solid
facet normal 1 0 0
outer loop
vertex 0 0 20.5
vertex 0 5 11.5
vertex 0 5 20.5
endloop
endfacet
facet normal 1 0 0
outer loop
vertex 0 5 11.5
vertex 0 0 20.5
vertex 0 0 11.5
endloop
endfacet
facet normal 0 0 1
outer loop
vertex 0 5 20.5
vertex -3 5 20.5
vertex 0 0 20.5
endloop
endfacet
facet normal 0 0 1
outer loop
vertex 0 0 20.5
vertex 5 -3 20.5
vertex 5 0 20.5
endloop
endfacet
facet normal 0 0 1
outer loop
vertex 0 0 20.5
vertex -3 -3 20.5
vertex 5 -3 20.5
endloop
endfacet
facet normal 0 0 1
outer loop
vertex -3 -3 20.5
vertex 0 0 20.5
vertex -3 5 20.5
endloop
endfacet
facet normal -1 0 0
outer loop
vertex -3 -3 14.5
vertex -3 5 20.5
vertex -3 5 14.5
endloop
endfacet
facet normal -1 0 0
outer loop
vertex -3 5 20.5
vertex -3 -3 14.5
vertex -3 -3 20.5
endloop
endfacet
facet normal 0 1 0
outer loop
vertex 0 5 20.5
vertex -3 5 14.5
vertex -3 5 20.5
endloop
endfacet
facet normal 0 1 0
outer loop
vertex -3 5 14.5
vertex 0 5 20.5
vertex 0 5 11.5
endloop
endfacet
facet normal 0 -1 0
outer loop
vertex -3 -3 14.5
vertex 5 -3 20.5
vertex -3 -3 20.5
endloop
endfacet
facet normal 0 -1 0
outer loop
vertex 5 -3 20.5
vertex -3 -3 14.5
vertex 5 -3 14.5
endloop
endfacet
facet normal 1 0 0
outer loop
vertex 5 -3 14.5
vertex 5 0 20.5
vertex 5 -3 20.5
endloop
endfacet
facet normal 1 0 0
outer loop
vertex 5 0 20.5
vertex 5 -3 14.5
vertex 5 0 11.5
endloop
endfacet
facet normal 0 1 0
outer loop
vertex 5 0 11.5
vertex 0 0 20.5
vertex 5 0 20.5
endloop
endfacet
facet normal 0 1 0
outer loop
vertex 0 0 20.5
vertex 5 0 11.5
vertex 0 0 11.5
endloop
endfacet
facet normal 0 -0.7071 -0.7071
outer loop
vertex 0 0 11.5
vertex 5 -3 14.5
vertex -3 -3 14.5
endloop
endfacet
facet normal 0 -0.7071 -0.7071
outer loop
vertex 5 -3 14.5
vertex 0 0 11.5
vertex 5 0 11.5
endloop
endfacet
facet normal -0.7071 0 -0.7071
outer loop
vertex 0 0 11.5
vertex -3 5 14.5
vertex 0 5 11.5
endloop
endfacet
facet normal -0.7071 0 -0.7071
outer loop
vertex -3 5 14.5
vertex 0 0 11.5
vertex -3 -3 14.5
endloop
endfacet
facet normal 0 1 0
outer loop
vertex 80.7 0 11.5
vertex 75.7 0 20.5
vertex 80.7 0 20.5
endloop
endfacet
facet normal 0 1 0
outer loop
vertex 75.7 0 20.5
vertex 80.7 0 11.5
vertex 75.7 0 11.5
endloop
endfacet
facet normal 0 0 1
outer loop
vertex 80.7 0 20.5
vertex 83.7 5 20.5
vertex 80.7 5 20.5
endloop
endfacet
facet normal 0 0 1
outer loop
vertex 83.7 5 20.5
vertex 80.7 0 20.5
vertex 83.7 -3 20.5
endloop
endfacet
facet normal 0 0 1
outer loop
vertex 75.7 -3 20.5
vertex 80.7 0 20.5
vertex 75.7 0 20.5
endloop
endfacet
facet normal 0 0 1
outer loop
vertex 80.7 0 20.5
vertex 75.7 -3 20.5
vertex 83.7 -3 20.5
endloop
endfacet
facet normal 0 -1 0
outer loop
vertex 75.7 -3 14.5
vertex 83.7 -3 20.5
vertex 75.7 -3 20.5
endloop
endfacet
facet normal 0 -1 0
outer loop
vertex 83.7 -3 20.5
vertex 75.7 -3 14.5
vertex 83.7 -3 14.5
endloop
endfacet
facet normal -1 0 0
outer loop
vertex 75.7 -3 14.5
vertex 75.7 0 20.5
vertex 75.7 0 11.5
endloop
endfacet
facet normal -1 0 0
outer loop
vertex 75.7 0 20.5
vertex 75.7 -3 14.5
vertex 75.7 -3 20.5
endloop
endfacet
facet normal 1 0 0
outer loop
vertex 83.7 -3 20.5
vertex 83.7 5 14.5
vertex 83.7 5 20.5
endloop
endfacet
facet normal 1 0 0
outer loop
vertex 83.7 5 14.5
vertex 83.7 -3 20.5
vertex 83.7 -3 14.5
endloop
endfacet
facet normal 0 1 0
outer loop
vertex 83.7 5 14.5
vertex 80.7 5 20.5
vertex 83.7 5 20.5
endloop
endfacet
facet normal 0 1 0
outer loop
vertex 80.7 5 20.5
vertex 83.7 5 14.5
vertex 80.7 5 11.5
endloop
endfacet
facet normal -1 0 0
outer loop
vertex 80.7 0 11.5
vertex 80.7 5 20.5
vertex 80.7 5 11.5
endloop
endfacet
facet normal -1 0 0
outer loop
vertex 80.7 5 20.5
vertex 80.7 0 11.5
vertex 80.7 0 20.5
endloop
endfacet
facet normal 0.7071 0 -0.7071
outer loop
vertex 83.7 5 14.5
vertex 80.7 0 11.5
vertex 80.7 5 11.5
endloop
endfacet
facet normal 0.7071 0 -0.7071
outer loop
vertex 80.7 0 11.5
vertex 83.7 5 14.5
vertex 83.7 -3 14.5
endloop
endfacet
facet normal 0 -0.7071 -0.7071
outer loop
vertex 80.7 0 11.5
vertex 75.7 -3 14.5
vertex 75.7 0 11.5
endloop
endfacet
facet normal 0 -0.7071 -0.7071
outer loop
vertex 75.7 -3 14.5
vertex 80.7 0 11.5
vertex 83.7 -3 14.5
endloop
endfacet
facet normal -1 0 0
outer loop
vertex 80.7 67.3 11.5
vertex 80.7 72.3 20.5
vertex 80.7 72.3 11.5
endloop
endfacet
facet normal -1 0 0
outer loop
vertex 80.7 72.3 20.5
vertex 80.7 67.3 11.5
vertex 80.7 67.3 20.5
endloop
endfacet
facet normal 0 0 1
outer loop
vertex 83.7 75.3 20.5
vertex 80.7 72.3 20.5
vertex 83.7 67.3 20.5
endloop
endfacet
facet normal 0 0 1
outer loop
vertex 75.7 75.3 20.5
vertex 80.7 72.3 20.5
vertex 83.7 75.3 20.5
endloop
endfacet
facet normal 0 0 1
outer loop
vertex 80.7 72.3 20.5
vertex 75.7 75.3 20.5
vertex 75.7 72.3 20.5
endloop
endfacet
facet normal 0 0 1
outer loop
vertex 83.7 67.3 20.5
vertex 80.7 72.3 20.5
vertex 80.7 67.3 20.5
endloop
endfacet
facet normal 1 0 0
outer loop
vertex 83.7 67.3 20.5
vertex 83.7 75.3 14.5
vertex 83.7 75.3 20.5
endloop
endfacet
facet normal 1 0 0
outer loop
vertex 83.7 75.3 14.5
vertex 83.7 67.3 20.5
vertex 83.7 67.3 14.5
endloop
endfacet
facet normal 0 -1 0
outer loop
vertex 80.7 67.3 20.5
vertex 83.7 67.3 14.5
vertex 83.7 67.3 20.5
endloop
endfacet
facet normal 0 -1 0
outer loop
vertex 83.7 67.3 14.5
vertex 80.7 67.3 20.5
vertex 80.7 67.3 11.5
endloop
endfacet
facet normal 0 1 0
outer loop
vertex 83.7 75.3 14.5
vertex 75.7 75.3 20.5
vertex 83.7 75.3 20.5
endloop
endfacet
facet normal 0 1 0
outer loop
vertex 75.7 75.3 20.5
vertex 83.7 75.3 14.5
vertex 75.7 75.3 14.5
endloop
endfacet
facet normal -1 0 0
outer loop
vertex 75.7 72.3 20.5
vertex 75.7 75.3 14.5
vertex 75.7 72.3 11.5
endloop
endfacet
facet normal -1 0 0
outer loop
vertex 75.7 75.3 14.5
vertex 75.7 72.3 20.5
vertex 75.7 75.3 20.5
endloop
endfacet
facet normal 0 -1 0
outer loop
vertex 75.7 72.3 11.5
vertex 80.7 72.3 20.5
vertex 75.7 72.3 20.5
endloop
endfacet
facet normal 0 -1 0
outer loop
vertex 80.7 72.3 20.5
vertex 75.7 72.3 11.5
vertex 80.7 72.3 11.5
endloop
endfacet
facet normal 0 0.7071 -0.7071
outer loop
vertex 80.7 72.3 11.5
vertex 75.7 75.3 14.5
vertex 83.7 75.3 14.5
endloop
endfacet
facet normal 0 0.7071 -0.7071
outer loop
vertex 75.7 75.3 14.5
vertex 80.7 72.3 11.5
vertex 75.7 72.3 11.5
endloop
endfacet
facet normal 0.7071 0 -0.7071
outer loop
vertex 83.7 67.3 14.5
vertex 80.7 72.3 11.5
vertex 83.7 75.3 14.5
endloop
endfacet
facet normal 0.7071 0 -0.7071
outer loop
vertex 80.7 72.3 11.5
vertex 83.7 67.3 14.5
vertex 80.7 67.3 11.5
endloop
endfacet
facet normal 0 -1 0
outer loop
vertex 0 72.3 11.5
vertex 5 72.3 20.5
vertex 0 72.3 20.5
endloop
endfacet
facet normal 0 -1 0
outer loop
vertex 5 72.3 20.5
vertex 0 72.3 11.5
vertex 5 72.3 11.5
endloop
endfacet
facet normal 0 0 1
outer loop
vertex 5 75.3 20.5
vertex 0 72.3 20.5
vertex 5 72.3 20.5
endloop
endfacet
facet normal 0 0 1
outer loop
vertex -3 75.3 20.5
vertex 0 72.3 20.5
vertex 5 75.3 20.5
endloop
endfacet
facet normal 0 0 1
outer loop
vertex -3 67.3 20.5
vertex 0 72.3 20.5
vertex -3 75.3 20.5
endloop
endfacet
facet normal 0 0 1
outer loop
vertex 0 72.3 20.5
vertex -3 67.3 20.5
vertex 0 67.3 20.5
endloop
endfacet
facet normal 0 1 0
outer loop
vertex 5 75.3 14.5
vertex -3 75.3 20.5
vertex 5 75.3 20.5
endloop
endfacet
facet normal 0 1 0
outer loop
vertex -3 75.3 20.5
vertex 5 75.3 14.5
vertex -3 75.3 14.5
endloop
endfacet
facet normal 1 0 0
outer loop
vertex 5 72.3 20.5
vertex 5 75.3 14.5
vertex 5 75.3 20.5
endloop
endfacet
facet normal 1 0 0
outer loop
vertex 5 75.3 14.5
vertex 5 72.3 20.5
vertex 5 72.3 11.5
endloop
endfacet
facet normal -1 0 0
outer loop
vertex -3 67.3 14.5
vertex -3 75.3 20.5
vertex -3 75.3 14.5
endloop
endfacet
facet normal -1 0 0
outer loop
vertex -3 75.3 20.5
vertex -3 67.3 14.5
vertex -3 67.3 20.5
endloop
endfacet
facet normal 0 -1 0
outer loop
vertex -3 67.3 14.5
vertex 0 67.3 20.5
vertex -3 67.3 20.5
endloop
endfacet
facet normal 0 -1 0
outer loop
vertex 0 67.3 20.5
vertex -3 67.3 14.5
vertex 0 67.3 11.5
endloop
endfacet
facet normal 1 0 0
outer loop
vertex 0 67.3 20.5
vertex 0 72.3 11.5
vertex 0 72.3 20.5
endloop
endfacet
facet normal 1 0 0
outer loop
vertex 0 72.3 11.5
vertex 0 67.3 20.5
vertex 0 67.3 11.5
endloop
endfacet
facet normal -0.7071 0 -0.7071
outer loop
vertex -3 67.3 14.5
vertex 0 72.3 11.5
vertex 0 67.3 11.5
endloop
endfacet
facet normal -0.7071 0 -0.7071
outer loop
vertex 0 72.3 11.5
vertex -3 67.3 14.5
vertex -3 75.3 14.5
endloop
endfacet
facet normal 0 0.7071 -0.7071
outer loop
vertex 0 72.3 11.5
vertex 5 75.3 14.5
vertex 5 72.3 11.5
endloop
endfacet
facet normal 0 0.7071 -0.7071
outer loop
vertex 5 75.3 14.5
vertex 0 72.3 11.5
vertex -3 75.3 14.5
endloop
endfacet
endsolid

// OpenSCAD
// Bloc Glockenspiel Moteur

// Hauteur : 15 mm
// Largeur : 72 mm
// Longueur : 80.5 mm

Hauteur = 17.5;
Largeur = 72.3;
Longueur = 80.7;
EpaisseurCale = 3;
EpaisseurAxes = 5;
EpaisseurSocle = 20;

//support ();

translate ([ -EpaisseurCale, -EpaisseurCale, Hauteur - EpaisseurCale] ) 
	cale ();

translate ([ Longueur + EpaisseurCale, -EpaisseurCale, Hauteur - EpaisseurCale] ) 
	rotate ([ 0, 0, 90])
		cale ();

translate ([ Longueur + EpaisseurCale, Largeur + EpaisseurCale, Hauteur - EpaisseurCale] ) 
	rotate ([ 0, 0, 180])
		cale ();

translate ([ -EpaisseurCale, Largeur + EpaisseurCale, Hauteur - EpaisseurCale] ) 
	rotate ([ 0, 0, 270])
		cale ();

module cale ()
{
	C0 = [ EpaisseurAxes + EpaisseurCale, 0,             0];
	C1 = [ 0,             0,             0];
	C2 = [ 0,             EpaisseurAxes + EpaisseurCale, 0];
	C3 = [ EpaisseurAxes + EpaisseurCale, EpaisseurCale, 0];
	C4 = [ EpaisseurCale, EpaisseurCale, 0];
	C5 = [ EpaisseurCale, EpaisseurAxes + EpaisseurCale, 0];
	C6 = [ EpaisseurAxes + EpaisseurCale, EpaisseurCale, -EpaisseurCale];
	C7 = [ EpaisseurCale, EpaisseurCale, -EpaisseurCale];
	C8 = [ EpaisseurCale, EpaisseurAxes + EpaisseurCale, -EpaisseurCale];

	cube ( [ EpaisseurCale, EpaisseurAxes + EpaisseurCale, EpaisseurCale * 2] );
	cube ( [ EpaisseurAxes + EpaisseurCale, EpaisseurCale, EpaisseurCale * 2] );

	polyhedron 
		( points = [ 
				   C0, C1, C2, C3, C4, C5, C6, C7, C8,
				  ],
		  triangles = [ 
					[ 0, 3, 6], [ 2, 8, 5],
					[ 3, 4, 7], [ 6, 3, 7],
					[ 5, 7, 4], [ 5, 8, 7],
					[ 0, 7, 1], [ 0, 6, 7],
					[ 1, 8, 2], [ 1, 7, 8],
					[ 0, 1, 4], [ 0, 4, 3],
					[ 4, 2, 5], [ 4, 1, 2],
				  ]
		);
}

module support ()
{
P0  = [ 0, 0, 0];
P1  = [ 0, EpaisseurAxes, 0];
P2  = [ Longueur / 2 - EpaisseurAxes, Largeur / 2, 0];
P3  = [ 0, Largeur - EpaisseurAxes, 0];
P4  = [ 0, Largeur, 0];
P5  = [ EpaisseurAxes, Largeur, 0];
P6  = [ Longueur / 2, Largeur / 2 + EpaisseurAxes, 0];
P7  = [ Longueur - EpaisseurAxes, Largeur, 0];
P8  = [ Longueur, Largeur, 0];
P9  = [ Longueur, Largeur - EpaisseurAxes, 0];
P10 = [ Longueur / 2 + EpaisseurAxes, Largeur / 2, 0];
P11 = [ Longueur, EpaisseurAxes, 0];
P12 = [ Longueur, 0, 0];
P13 = [ Longueur - EpaisseurAxes, 0, 0];
P14 = [ Longueur / 2, Largeur / 2 - EpaisseurAxes, 0];
P15 = [ EpaisseurAxes, 0, 0];

P16 = [ 0, 0, Hauteur];
P17 = [ 0, EpaisseurAxes, Hauteur];
P18 = [ Longueur / 2 - EpaisseurAxes, Largeur / 2, Hauteur];
P19 = [ 0, Largeur - EpaisseurAxes, Hauteur];
P20 = [ 0, Largeur, Hauteur];
P21 = [ EpaisseurAxes, Largeur, Hauteur];
P22 = [ Longueur / 2, Largeur / 2 + EpaisseurAxes, Hauteur];
P23 = [ Longueur - EpaisseurAxes, Largeur, Hauteur];
P24 = [ Longueur, Largeur, Hauteur];
P25 = [ Longueur, Largeur - EpaisseurAxes, Hauteur];
P26 = [ Longueur / 2 + EpaisseurAxes, Largeur / 2, Hauteur];
P27 = [ Longueur, EpaisseurAxes, Hauteur];
P28 = [ Longueur, 0, Hauteur];
P29 = [ Longueur - EpaisseurAxes, 0, Hauteur];
P30 = [ Longueur / 2, Largeur / 2 - EpaisseurAxes, Hauteur];
P31 = [ EpaisseurAxes, 0, Hauteur];


	polyhedron 
		( points = [ 
				   P0,  P1,  P2,  P3,  P4,  P5,  P6,  P7, 
				   P8,  P9,  P10, P11, P12, P13, P14, P15, 
				   P16, P17, P18, P19, P20, P21, P22, P23, 
                    P24, P25, P26, P27, P28, P29, P30, P31 
				  ],
		  triangles = [ 
					  [  0, 15,  1], [  1, 15,  7],
					  [  4,  3,  5], [  3, 13,  5],
					  [  8,  7,  9], [  7, 15,  9],
					  [ 12, 11, 13], [ 13, 11,  5],

					  [  0,  1, 16], [  1, 17, 16], 
					  [  0, 16, 15], [ 15, 16, 31], 

					  [  4,  5, 20], [  5, 21, 20], 
					  [  4, 20, 19], [  4, 19,  3], 

					  [  8,  9, 24], [  9, 25, 24], 
					  [  8, 24, 23], [  8, 23,  7], 

					  [ 12, 13, 28], [ 13, 29, 28], 
					  [ 12, 28, 27], [ 12, 27, 11], 

					  [  1,  7, 17], [  7, 23, 17],
					  [ 15, 31,  9], [  9, 31, 25],

					  [  5, 11, 21], [ 11, 27, 21],
					  [  3, 19, 13], [ 13, 19, 29],

					  [ 16, 17, 31], [ 17, 23, 31],
					  [ 20, 21, 19], [ 19, 21, 27],
					  [ 24, 25, 23], [ 23, 25, 31],
					  [ 28, 29, 27], [ 29, 19, 27]
				  ]
		);
}
